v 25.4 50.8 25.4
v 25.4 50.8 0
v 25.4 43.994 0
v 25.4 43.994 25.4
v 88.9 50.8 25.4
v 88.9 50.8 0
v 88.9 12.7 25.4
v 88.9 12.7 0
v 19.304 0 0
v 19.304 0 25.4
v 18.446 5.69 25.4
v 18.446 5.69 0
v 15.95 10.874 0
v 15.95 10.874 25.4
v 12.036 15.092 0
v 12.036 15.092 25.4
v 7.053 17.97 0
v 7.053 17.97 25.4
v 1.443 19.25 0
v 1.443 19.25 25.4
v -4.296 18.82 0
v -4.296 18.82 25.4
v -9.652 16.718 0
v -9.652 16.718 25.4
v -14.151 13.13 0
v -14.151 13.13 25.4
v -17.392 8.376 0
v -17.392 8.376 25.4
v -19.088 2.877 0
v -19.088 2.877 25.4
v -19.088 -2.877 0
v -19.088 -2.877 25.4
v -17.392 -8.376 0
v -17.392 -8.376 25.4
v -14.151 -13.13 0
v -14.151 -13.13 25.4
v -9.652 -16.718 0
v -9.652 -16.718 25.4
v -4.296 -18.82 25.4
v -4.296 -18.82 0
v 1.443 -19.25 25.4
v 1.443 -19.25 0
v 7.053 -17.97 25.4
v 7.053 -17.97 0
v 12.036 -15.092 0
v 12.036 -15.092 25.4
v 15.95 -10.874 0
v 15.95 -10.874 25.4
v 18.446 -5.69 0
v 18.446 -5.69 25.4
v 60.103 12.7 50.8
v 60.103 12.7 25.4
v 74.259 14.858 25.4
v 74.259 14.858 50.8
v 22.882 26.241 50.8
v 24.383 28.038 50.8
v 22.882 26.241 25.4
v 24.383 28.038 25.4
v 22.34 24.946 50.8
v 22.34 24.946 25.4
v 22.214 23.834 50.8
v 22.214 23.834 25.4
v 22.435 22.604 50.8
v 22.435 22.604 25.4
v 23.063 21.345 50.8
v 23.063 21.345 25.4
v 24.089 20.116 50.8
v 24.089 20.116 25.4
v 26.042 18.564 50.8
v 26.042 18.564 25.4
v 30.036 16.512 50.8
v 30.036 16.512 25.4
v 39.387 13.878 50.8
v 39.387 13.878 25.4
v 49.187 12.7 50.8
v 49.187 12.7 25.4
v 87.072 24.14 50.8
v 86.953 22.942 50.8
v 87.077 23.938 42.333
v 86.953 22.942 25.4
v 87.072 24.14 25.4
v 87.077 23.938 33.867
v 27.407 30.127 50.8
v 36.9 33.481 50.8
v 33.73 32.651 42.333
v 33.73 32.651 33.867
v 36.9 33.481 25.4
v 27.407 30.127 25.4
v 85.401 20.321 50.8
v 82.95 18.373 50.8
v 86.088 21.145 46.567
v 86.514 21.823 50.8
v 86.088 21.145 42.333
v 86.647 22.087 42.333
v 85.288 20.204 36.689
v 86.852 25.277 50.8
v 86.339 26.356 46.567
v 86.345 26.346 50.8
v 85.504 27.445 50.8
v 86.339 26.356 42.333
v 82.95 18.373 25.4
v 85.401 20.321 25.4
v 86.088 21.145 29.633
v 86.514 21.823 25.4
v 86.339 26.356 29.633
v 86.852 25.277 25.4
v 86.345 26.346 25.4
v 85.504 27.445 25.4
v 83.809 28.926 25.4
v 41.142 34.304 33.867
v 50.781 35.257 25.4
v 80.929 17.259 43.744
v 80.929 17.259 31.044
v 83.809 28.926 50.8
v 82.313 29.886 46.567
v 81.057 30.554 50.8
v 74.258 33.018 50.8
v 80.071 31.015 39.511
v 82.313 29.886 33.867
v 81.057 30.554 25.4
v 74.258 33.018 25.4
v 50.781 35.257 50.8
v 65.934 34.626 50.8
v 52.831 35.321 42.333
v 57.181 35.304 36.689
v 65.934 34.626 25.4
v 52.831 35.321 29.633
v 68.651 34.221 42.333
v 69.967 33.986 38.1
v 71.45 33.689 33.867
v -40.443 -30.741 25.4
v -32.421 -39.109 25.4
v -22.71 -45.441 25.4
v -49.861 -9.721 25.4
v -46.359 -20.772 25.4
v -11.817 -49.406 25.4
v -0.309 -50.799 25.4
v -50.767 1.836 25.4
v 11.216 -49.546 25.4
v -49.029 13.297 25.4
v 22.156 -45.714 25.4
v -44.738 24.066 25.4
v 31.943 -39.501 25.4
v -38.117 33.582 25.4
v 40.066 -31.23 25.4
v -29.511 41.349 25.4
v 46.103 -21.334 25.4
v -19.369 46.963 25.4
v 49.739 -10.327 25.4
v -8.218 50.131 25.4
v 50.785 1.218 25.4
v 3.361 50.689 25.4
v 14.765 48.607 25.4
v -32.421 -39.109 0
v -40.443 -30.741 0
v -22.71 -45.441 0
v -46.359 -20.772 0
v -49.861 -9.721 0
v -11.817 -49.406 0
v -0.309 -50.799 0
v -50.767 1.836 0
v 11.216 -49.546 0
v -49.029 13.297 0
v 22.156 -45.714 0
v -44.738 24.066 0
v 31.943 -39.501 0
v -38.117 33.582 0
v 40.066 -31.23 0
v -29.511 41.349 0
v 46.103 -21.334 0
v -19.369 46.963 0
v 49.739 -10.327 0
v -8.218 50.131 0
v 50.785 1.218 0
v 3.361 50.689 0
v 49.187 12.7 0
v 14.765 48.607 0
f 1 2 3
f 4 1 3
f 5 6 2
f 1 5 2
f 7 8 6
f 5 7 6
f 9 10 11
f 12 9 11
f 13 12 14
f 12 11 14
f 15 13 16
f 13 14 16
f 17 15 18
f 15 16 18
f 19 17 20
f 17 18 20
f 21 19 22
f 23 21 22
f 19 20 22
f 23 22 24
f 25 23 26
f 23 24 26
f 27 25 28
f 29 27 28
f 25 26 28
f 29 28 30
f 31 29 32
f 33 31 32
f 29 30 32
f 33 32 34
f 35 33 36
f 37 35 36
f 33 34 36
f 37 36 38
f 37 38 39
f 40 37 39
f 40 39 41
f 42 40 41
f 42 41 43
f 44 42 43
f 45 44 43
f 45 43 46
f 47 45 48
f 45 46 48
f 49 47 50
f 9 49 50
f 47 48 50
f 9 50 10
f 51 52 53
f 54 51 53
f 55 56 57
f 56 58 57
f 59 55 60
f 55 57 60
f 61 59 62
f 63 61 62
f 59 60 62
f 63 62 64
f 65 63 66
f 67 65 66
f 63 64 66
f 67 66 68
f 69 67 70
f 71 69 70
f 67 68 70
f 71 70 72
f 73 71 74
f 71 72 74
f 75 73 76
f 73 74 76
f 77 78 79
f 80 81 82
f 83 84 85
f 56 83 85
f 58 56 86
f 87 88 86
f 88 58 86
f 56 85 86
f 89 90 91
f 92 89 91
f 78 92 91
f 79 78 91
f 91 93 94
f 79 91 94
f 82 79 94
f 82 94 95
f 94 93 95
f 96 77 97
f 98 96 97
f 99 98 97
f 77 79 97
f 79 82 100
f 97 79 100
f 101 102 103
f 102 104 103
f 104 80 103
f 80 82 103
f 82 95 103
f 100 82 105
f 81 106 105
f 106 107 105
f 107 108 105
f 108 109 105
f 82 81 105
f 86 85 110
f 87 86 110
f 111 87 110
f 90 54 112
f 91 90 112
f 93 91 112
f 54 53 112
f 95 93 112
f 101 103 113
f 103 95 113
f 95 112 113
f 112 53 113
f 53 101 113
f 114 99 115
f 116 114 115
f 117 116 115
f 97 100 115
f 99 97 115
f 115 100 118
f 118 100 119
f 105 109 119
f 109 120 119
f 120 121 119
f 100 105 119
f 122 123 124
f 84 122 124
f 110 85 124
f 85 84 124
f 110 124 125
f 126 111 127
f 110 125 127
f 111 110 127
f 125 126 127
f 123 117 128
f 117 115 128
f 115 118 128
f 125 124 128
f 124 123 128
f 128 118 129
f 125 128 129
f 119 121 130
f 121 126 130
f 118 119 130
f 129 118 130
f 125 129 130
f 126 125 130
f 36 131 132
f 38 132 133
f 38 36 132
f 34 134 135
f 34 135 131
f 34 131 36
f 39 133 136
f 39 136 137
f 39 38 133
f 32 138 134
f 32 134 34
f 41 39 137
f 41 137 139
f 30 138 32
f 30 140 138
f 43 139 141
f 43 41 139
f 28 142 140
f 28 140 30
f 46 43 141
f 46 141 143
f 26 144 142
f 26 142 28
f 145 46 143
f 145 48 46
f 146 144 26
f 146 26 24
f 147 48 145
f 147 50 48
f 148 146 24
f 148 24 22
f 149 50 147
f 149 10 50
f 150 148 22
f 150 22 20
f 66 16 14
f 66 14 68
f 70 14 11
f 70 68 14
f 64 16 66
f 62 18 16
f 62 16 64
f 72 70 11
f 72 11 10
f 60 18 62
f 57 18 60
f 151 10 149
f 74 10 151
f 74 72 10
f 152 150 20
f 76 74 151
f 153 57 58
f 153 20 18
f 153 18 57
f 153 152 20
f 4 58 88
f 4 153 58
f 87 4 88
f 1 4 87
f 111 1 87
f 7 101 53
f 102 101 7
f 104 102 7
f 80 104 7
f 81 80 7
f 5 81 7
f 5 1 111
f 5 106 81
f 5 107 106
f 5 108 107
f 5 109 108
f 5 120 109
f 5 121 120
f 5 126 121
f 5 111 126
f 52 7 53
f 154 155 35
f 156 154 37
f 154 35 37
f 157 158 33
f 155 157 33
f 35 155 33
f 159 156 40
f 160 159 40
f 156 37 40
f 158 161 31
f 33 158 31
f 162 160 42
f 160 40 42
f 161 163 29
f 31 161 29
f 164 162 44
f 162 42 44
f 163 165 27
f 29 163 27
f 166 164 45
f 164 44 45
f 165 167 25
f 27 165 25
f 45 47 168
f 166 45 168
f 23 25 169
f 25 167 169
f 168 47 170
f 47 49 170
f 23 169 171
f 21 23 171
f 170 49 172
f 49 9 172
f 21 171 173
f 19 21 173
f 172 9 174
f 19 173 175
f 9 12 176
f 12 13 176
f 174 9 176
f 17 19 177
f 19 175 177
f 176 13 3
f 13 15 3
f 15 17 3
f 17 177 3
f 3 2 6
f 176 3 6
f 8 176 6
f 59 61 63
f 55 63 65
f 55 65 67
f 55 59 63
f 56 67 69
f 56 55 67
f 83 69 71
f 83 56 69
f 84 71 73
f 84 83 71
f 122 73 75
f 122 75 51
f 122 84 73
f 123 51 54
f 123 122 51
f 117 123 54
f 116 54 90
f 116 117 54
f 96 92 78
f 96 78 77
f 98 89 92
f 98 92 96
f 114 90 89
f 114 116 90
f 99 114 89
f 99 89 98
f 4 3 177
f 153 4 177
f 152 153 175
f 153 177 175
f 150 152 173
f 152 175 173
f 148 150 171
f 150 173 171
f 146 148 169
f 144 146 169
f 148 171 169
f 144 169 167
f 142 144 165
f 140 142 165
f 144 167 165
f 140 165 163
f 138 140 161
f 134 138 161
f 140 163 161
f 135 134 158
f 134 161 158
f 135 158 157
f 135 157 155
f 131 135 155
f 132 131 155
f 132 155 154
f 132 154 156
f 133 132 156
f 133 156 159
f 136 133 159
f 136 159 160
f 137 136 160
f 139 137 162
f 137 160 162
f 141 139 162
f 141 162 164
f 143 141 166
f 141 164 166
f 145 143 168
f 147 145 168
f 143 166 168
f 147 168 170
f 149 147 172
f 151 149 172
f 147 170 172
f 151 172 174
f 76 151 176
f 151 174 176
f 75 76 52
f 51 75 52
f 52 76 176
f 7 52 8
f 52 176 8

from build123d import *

# Parameters (mm, degrees)
F1_DEPTH = 25.4
F2_R     = 19.304
F3_DEPTH = 25.4
F5_DEPTH = 25.4


with BuildPart() as f1:
    # F0 (on Top) → F1 (new body)
    with BuildSketch(Plane.XY):
        with BuildLine():
            Line((25.4, 50.8), (25.4, 43.9940905122))
            ThreePointArc((25.4, 43.9940905122), (-40.4429352194, -30.7409985336), (49.1868884968, 12.7))
            Line((49.1868884968, 12.7), (88.9, 12.7))
            Line((88.9, 12.7), (88.9, 50.8))
            Line((88.9, 50.8), (25.4, 50.8))
        make_face()
    extrude(amount=F1_DEPTH)

    # F2 (on face) → F3 (cut)
    with BuildSketch(Plane.XY.offset(25.4)):
        Circle(F2_R)
    extrude(amount=-F3_DEPTH, mode=Mode.SUBTRACT)

    # F4 (on face) → F5 (join)
    with BuildSketch(Plane.XY.offset(25.4)):
        with BuildLine():
            add(Edge.make_bspline(
                [(60.102772553, 12.7), (87.0769461658, 14.318798375), (87.0769461658, 23.9380020648)],
                knots=[4.8814818134, 4.8814818134, 4.8814818134, 6.2831853072, 6.2831853072, 6.2831853072], degree=2, weights=[1, 0.7642931995, 1]))
            add(Edge.make_bspline(
                [(87.0769461658, 23.9380020648), (87.0769461658, 48.4737315929), (33.7303676113, 32.6514025486), (-19.6162109432, 16.8290735043), (49.1868884968, 12.7)],
                knots=[0, 0, 0, 2.2716480737, 2.2716480737, 4.5432961473, 4.5432961473, 4.5432961473], degree=2, weights=[1, 0.4213852718, 1, 0.4213852718, 1]))
            Line((49.1868884968, 12.7), (60.102772553, 12.7))
        make_face()
    extrude(amount=F5_DEPTH)


solid = f1.part
